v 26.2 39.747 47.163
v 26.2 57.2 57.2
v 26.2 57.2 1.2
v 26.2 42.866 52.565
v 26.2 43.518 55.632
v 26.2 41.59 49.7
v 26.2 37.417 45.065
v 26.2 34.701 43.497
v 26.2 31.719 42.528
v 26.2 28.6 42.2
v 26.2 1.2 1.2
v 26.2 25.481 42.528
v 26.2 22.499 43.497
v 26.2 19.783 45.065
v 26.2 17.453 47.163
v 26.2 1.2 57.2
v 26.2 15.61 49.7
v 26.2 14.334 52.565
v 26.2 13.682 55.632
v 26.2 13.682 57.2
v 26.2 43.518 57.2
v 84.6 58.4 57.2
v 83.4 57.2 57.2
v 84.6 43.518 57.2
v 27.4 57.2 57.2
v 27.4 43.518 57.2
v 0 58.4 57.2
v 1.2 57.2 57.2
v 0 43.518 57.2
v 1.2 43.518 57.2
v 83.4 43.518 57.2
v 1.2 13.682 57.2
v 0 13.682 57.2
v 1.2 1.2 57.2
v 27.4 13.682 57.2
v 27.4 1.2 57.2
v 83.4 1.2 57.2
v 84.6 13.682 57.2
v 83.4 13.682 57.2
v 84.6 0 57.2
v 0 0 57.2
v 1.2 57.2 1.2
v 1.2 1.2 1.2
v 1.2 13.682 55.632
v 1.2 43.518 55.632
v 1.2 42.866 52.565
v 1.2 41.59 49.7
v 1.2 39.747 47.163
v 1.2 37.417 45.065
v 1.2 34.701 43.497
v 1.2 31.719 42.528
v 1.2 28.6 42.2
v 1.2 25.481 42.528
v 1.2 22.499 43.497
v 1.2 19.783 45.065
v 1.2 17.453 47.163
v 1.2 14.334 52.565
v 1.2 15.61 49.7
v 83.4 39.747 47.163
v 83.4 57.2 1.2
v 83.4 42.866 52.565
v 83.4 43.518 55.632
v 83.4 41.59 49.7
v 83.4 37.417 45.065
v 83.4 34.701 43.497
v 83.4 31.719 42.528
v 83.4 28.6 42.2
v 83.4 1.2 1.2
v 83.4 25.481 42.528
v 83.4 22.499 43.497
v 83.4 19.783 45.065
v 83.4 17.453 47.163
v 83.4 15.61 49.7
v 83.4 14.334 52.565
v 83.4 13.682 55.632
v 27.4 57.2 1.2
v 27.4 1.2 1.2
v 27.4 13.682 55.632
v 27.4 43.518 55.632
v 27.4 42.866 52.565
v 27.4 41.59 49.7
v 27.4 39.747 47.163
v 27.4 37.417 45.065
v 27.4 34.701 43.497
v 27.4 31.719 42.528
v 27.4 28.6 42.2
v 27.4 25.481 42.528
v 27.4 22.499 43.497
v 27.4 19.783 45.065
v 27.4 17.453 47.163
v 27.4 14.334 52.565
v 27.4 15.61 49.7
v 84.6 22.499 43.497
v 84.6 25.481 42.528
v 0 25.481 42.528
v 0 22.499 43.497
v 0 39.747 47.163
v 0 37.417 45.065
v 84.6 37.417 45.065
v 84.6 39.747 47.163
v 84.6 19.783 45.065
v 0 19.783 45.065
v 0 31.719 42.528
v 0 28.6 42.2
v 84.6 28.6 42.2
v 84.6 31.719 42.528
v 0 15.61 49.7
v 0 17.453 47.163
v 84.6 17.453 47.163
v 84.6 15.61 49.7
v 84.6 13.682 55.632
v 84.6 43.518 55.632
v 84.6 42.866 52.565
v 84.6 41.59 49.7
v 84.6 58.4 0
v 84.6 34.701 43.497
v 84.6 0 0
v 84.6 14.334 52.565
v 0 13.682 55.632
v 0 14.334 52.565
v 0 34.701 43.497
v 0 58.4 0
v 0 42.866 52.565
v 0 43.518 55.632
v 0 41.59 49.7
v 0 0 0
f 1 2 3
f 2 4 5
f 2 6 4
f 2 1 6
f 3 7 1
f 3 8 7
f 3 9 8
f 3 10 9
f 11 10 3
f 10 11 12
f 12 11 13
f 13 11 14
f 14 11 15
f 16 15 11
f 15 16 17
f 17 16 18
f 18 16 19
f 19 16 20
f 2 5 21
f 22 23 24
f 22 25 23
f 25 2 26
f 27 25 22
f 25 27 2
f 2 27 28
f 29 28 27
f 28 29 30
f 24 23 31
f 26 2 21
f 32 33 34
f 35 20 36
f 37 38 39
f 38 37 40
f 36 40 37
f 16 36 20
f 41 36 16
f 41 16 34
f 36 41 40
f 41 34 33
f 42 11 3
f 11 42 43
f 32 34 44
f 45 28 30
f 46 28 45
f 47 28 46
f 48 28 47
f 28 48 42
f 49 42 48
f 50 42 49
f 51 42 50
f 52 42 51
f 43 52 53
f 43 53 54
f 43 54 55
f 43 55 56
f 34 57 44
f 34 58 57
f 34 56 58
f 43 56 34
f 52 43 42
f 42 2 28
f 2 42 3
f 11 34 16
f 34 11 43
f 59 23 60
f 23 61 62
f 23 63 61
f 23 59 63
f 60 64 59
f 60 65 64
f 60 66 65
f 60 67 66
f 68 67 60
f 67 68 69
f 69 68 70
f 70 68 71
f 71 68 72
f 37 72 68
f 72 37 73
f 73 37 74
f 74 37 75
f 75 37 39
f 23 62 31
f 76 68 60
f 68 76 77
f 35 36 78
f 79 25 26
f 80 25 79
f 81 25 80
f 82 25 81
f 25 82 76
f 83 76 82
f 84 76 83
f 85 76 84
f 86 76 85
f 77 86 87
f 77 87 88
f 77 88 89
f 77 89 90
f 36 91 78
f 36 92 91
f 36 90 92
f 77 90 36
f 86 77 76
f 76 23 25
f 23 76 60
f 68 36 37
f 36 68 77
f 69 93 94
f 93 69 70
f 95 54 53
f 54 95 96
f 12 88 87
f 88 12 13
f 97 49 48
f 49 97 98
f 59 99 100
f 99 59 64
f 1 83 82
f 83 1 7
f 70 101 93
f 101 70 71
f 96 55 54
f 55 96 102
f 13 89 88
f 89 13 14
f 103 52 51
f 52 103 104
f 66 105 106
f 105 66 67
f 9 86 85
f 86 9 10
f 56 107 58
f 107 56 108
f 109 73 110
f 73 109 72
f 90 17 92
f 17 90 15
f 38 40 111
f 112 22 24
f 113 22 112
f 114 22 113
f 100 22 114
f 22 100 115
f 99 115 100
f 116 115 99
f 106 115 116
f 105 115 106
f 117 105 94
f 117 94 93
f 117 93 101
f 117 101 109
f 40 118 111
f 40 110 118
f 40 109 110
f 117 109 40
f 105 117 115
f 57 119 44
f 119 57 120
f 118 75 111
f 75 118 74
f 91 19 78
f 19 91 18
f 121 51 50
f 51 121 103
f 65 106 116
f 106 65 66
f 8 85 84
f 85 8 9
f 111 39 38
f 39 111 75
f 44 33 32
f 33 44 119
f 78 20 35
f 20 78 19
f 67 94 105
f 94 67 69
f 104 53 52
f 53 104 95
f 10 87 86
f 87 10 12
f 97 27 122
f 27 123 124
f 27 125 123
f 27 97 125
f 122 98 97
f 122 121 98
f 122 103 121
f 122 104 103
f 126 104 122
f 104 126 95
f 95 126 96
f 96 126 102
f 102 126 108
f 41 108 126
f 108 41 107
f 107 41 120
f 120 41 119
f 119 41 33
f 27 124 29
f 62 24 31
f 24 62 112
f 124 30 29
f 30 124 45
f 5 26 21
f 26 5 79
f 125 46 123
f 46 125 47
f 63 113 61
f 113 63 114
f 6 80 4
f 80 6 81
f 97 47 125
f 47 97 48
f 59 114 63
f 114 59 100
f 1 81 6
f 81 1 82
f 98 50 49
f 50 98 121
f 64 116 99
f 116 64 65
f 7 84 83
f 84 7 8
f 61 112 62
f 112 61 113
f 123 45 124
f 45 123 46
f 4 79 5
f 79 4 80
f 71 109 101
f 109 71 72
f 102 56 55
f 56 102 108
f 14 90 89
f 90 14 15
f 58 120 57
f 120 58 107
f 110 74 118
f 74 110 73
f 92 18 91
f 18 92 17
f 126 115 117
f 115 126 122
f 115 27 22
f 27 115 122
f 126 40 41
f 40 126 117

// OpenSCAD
Space = 1;
Wall = 1.2;

Card_Size_x = 55 + Space;
Card_Size_y = 55 + Space;
Card_Size_z_B = 24 + Space;
Card_Size_z_W = 55 + Space;

Grip_Dia = 30;

Show_Base = true;
Show_Cover = false;

module Base()
{
  difference()
  {
    cube([(Card_Size_z_B + Card_Size_z_W + (3 * Wall)),
          (Card_Size_y + (2 * Wall)),   
          (Card_Size_x + Wall)]);
    union()
    {
      translate([Wall, Wall, Wall])
      {
        cube([Card_Size_z_B, Card_Size_y, Card_Size_x]);
      }
      translate([Card_Size_z_B + (2 * Wall), Wall, Wall])
      {
        cube([Card_Size_z_W, Card_Size_y, Card_Size_x]);
      }
      translate([0, (Card_Size_y + Wall) / 2, Card_Size_x + Wall])
      {
        rotate([0, 90, 0])
        {
          cylinder(d = Grip_Dia, h = (Card_Size_z_B + Card_Size_z_W + (3 * Wall)));
        }
      }
    }
  }
}
module Cover()
{
  difference()
  {
    cube([(Card_Size_z_B + Card_Size_z_W + (3 * Wall)) + Space + (2 * Wall),
          (Card_Size_y + (2 * Wall)) + Space + (2 * Wall),   
          (Card_Size_x + Wall)+ Space + Wall]);
    union()
    {
      translate([Wall, Wall, Wall])
      {
        cube([(Card_Size_z_B + Card_Size_z_W + (3 * Wall)) + Space,
          (Card_Size_y + (2 * Wall)) + Space,   
          (Card_Size_x + Wall)+ Space]);
      }
      translate([0, (Card_Size_y + Wall) / 2, Card_Size_x + Wall])
      {
        rotate([0, 90, 0])
        {
          cylinder(d = Grip_Dia, h = (Card_Size_z_B + Card_Size_z_W + (3 * Wall)) + Space + (2 * Wall));
        }
      }
      
      translate([0,0,510])
      {
        cube([1000,1000,1000], center = true);
      }
    }
    
  }
}

if(Show_Base)
{
  Base();
}
else if(Show_Cover)
{
  Cover();
}
